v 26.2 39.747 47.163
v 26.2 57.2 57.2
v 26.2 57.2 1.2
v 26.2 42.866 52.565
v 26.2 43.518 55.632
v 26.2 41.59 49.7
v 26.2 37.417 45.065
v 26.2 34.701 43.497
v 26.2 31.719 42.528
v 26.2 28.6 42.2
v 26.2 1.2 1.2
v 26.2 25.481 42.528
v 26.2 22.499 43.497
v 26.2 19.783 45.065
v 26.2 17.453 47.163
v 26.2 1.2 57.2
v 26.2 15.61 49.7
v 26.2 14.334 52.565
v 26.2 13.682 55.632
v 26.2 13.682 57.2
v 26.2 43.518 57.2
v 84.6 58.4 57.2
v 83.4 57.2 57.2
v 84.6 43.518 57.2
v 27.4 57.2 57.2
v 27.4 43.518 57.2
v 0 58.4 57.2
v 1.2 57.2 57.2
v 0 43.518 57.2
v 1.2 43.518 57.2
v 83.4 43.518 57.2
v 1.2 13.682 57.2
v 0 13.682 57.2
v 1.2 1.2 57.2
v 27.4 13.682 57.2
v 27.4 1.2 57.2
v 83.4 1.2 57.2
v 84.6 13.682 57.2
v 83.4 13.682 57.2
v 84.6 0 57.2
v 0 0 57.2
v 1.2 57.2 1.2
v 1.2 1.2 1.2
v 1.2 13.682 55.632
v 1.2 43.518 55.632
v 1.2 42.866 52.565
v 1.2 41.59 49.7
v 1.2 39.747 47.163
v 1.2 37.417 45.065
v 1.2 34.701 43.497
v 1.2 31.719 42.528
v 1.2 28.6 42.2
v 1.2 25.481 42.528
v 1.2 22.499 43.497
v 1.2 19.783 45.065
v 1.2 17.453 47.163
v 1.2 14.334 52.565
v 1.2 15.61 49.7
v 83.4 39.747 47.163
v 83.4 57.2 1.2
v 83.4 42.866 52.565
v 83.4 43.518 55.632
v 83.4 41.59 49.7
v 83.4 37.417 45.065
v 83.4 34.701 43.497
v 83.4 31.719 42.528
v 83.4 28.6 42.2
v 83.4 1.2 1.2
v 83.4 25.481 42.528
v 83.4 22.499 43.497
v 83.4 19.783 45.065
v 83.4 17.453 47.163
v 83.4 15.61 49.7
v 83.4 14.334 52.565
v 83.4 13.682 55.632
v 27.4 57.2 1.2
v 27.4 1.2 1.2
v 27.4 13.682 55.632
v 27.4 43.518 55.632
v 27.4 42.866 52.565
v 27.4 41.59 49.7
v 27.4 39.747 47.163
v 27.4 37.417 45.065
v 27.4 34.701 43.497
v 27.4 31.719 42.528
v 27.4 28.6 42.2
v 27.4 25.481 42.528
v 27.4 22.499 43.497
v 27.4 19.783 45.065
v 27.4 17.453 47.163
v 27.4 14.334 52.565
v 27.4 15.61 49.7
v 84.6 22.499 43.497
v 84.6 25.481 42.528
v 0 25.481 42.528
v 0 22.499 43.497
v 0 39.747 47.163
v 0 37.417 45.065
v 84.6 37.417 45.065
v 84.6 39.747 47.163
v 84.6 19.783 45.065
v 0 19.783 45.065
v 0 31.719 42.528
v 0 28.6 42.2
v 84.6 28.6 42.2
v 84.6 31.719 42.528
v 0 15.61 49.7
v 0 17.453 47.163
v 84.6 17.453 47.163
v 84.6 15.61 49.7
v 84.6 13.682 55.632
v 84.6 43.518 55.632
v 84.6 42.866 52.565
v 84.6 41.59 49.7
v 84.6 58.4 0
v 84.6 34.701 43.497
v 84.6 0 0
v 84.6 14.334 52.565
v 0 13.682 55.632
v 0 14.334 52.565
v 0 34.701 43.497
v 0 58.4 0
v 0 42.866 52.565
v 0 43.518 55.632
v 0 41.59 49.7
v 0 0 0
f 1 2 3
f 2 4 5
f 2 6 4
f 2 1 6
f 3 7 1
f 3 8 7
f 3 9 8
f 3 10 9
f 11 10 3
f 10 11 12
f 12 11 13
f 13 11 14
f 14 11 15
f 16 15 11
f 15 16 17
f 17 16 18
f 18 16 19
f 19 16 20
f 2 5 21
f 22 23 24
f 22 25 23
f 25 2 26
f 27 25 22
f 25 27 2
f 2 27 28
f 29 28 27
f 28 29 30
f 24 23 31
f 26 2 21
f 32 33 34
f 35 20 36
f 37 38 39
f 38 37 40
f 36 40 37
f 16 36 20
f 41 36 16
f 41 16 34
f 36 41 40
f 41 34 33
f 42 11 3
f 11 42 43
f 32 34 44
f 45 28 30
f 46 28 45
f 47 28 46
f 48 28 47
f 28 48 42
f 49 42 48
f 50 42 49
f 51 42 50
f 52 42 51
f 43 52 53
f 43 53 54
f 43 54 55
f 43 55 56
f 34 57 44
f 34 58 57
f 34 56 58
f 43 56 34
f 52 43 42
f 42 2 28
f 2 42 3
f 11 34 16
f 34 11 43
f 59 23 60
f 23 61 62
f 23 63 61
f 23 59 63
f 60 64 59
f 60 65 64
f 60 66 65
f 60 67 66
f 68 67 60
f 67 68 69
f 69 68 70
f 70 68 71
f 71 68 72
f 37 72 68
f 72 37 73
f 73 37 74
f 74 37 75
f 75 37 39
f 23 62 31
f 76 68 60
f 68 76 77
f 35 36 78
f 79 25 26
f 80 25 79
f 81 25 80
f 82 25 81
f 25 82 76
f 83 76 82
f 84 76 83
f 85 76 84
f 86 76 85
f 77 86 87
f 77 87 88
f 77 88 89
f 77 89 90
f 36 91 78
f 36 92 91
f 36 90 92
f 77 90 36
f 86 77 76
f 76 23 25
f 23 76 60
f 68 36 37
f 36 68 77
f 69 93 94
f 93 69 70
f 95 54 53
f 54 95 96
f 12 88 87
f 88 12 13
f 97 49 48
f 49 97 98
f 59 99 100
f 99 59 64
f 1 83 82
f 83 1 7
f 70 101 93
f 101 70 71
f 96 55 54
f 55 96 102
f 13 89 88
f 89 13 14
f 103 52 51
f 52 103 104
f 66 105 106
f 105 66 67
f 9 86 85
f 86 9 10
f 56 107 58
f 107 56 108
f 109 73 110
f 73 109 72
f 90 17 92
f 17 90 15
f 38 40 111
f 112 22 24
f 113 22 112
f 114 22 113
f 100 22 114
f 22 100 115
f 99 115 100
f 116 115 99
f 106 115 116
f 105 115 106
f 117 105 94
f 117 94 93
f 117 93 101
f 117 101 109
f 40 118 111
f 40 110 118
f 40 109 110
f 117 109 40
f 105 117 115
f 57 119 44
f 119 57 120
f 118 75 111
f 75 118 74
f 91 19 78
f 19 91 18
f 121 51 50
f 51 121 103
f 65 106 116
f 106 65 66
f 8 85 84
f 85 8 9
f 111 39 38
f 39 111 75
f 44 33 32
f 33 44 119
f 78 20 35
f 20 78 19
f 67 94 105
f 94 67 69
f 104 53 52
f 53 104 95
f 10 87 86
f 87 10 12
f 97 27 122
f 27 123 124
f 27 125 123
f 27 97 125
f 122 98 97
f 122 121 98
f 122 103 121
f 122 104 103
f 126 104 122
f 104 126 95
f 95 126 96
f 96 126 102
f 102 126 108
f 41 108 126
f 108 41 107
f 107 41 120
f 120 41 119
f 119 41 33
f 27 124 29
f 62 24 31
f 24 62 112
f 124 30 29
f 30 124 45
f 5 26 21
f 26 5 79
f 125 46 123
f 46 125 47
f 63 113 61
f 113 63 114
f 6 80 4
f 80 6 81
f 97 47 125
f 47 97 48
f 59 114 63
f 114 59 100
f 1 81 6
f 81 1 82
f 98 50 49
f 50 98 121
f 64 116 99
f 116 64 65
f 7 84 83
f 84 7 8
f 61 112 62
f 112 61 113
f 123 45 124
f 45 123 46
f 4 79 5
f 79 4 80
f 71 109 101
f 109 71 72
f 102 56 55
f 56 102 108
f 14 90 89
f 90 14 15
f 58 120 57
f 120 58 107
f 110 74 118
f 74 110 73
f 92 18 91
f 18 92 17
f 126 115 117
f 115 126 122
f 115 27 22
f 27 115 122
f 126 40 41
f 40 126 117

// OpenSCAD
Space = 1;
Wall = 1.2;

Card_Size_x = 55 + Space;
Card_Size_y = 55 + Space;
Card_Size_z_B = 24 + Space;
Card_Size_z_W = 55 + Space;

Grip_Dia = 30;

Show_Base = true;
Show_Cover = false;

module Base()
{
  difference()
  {
    cube([(Card_Size_z_B + Card_Size_z_W + (3 * Wall)),
          (Card_Size_y + (2 * Wall)),   
          (Card_Size_x + Wall)]);
    union()
    {
      translate([Wall, Wall, Wall])
      {
        cube([Card_Size_z_B, Card_Size_y, Card_Size_x]);
      }
      translate([Card_Size_z_B + (2 * Wall), Wall, Wall])
      {
        cube([Card_Size_z_W, Card_Size_y, Card_Size_x]);
      }
      translate([0, (Card_Size_y + Wall) / 2, Card_Size_x + Wall])
      {
        rotate([0, 90, 0])
        {
          cylinder(d = Grip_Dia, h = (Card_Size_z_B + Card_Size_z_W + (3 * Wall)));
        }
      }
    }
  }
}
module Cover()
{
  difference()
  {
    cube([(Card_Size_z_B + Card_Size_z_W + (3 * Wall)) + Space + (2 * Wall),
          (Card_Size_y + (2 * Wall)) + Space + (2 * Wall),   
          (Card_Size_x + Wall)+ Space + Wall]);
    union()
    {
      translate([Wall, Wall, Wall])
      {
        cube([(Card_Size_z_B + Card_Size_z_W + (3 * Wall)) + Space,
          (Card_Size_y + (2 * Wall)) + Space,   
          (Card_Size_x + Wall)+ Space]);
      }
      translate([0, (Card_Size_y + Wall) / 2, Card_Size_x + Wall])
      {
        rotate([0, 90, 0])
        {
          cylinder(d = Grip_Dia, h = (Card_Size_z_B + Card_Size_z_W + (3 * Wall)) + Space + (2 * Wall));
        }
      }
      
      translate([0,0,510])
      {
        cube([1000,1000,1000], center = true);
      }
    }
    
  }
}

if(Show_Base)
{
  Base();
}
else if(Show_Cover)
{
  Cover();
}
